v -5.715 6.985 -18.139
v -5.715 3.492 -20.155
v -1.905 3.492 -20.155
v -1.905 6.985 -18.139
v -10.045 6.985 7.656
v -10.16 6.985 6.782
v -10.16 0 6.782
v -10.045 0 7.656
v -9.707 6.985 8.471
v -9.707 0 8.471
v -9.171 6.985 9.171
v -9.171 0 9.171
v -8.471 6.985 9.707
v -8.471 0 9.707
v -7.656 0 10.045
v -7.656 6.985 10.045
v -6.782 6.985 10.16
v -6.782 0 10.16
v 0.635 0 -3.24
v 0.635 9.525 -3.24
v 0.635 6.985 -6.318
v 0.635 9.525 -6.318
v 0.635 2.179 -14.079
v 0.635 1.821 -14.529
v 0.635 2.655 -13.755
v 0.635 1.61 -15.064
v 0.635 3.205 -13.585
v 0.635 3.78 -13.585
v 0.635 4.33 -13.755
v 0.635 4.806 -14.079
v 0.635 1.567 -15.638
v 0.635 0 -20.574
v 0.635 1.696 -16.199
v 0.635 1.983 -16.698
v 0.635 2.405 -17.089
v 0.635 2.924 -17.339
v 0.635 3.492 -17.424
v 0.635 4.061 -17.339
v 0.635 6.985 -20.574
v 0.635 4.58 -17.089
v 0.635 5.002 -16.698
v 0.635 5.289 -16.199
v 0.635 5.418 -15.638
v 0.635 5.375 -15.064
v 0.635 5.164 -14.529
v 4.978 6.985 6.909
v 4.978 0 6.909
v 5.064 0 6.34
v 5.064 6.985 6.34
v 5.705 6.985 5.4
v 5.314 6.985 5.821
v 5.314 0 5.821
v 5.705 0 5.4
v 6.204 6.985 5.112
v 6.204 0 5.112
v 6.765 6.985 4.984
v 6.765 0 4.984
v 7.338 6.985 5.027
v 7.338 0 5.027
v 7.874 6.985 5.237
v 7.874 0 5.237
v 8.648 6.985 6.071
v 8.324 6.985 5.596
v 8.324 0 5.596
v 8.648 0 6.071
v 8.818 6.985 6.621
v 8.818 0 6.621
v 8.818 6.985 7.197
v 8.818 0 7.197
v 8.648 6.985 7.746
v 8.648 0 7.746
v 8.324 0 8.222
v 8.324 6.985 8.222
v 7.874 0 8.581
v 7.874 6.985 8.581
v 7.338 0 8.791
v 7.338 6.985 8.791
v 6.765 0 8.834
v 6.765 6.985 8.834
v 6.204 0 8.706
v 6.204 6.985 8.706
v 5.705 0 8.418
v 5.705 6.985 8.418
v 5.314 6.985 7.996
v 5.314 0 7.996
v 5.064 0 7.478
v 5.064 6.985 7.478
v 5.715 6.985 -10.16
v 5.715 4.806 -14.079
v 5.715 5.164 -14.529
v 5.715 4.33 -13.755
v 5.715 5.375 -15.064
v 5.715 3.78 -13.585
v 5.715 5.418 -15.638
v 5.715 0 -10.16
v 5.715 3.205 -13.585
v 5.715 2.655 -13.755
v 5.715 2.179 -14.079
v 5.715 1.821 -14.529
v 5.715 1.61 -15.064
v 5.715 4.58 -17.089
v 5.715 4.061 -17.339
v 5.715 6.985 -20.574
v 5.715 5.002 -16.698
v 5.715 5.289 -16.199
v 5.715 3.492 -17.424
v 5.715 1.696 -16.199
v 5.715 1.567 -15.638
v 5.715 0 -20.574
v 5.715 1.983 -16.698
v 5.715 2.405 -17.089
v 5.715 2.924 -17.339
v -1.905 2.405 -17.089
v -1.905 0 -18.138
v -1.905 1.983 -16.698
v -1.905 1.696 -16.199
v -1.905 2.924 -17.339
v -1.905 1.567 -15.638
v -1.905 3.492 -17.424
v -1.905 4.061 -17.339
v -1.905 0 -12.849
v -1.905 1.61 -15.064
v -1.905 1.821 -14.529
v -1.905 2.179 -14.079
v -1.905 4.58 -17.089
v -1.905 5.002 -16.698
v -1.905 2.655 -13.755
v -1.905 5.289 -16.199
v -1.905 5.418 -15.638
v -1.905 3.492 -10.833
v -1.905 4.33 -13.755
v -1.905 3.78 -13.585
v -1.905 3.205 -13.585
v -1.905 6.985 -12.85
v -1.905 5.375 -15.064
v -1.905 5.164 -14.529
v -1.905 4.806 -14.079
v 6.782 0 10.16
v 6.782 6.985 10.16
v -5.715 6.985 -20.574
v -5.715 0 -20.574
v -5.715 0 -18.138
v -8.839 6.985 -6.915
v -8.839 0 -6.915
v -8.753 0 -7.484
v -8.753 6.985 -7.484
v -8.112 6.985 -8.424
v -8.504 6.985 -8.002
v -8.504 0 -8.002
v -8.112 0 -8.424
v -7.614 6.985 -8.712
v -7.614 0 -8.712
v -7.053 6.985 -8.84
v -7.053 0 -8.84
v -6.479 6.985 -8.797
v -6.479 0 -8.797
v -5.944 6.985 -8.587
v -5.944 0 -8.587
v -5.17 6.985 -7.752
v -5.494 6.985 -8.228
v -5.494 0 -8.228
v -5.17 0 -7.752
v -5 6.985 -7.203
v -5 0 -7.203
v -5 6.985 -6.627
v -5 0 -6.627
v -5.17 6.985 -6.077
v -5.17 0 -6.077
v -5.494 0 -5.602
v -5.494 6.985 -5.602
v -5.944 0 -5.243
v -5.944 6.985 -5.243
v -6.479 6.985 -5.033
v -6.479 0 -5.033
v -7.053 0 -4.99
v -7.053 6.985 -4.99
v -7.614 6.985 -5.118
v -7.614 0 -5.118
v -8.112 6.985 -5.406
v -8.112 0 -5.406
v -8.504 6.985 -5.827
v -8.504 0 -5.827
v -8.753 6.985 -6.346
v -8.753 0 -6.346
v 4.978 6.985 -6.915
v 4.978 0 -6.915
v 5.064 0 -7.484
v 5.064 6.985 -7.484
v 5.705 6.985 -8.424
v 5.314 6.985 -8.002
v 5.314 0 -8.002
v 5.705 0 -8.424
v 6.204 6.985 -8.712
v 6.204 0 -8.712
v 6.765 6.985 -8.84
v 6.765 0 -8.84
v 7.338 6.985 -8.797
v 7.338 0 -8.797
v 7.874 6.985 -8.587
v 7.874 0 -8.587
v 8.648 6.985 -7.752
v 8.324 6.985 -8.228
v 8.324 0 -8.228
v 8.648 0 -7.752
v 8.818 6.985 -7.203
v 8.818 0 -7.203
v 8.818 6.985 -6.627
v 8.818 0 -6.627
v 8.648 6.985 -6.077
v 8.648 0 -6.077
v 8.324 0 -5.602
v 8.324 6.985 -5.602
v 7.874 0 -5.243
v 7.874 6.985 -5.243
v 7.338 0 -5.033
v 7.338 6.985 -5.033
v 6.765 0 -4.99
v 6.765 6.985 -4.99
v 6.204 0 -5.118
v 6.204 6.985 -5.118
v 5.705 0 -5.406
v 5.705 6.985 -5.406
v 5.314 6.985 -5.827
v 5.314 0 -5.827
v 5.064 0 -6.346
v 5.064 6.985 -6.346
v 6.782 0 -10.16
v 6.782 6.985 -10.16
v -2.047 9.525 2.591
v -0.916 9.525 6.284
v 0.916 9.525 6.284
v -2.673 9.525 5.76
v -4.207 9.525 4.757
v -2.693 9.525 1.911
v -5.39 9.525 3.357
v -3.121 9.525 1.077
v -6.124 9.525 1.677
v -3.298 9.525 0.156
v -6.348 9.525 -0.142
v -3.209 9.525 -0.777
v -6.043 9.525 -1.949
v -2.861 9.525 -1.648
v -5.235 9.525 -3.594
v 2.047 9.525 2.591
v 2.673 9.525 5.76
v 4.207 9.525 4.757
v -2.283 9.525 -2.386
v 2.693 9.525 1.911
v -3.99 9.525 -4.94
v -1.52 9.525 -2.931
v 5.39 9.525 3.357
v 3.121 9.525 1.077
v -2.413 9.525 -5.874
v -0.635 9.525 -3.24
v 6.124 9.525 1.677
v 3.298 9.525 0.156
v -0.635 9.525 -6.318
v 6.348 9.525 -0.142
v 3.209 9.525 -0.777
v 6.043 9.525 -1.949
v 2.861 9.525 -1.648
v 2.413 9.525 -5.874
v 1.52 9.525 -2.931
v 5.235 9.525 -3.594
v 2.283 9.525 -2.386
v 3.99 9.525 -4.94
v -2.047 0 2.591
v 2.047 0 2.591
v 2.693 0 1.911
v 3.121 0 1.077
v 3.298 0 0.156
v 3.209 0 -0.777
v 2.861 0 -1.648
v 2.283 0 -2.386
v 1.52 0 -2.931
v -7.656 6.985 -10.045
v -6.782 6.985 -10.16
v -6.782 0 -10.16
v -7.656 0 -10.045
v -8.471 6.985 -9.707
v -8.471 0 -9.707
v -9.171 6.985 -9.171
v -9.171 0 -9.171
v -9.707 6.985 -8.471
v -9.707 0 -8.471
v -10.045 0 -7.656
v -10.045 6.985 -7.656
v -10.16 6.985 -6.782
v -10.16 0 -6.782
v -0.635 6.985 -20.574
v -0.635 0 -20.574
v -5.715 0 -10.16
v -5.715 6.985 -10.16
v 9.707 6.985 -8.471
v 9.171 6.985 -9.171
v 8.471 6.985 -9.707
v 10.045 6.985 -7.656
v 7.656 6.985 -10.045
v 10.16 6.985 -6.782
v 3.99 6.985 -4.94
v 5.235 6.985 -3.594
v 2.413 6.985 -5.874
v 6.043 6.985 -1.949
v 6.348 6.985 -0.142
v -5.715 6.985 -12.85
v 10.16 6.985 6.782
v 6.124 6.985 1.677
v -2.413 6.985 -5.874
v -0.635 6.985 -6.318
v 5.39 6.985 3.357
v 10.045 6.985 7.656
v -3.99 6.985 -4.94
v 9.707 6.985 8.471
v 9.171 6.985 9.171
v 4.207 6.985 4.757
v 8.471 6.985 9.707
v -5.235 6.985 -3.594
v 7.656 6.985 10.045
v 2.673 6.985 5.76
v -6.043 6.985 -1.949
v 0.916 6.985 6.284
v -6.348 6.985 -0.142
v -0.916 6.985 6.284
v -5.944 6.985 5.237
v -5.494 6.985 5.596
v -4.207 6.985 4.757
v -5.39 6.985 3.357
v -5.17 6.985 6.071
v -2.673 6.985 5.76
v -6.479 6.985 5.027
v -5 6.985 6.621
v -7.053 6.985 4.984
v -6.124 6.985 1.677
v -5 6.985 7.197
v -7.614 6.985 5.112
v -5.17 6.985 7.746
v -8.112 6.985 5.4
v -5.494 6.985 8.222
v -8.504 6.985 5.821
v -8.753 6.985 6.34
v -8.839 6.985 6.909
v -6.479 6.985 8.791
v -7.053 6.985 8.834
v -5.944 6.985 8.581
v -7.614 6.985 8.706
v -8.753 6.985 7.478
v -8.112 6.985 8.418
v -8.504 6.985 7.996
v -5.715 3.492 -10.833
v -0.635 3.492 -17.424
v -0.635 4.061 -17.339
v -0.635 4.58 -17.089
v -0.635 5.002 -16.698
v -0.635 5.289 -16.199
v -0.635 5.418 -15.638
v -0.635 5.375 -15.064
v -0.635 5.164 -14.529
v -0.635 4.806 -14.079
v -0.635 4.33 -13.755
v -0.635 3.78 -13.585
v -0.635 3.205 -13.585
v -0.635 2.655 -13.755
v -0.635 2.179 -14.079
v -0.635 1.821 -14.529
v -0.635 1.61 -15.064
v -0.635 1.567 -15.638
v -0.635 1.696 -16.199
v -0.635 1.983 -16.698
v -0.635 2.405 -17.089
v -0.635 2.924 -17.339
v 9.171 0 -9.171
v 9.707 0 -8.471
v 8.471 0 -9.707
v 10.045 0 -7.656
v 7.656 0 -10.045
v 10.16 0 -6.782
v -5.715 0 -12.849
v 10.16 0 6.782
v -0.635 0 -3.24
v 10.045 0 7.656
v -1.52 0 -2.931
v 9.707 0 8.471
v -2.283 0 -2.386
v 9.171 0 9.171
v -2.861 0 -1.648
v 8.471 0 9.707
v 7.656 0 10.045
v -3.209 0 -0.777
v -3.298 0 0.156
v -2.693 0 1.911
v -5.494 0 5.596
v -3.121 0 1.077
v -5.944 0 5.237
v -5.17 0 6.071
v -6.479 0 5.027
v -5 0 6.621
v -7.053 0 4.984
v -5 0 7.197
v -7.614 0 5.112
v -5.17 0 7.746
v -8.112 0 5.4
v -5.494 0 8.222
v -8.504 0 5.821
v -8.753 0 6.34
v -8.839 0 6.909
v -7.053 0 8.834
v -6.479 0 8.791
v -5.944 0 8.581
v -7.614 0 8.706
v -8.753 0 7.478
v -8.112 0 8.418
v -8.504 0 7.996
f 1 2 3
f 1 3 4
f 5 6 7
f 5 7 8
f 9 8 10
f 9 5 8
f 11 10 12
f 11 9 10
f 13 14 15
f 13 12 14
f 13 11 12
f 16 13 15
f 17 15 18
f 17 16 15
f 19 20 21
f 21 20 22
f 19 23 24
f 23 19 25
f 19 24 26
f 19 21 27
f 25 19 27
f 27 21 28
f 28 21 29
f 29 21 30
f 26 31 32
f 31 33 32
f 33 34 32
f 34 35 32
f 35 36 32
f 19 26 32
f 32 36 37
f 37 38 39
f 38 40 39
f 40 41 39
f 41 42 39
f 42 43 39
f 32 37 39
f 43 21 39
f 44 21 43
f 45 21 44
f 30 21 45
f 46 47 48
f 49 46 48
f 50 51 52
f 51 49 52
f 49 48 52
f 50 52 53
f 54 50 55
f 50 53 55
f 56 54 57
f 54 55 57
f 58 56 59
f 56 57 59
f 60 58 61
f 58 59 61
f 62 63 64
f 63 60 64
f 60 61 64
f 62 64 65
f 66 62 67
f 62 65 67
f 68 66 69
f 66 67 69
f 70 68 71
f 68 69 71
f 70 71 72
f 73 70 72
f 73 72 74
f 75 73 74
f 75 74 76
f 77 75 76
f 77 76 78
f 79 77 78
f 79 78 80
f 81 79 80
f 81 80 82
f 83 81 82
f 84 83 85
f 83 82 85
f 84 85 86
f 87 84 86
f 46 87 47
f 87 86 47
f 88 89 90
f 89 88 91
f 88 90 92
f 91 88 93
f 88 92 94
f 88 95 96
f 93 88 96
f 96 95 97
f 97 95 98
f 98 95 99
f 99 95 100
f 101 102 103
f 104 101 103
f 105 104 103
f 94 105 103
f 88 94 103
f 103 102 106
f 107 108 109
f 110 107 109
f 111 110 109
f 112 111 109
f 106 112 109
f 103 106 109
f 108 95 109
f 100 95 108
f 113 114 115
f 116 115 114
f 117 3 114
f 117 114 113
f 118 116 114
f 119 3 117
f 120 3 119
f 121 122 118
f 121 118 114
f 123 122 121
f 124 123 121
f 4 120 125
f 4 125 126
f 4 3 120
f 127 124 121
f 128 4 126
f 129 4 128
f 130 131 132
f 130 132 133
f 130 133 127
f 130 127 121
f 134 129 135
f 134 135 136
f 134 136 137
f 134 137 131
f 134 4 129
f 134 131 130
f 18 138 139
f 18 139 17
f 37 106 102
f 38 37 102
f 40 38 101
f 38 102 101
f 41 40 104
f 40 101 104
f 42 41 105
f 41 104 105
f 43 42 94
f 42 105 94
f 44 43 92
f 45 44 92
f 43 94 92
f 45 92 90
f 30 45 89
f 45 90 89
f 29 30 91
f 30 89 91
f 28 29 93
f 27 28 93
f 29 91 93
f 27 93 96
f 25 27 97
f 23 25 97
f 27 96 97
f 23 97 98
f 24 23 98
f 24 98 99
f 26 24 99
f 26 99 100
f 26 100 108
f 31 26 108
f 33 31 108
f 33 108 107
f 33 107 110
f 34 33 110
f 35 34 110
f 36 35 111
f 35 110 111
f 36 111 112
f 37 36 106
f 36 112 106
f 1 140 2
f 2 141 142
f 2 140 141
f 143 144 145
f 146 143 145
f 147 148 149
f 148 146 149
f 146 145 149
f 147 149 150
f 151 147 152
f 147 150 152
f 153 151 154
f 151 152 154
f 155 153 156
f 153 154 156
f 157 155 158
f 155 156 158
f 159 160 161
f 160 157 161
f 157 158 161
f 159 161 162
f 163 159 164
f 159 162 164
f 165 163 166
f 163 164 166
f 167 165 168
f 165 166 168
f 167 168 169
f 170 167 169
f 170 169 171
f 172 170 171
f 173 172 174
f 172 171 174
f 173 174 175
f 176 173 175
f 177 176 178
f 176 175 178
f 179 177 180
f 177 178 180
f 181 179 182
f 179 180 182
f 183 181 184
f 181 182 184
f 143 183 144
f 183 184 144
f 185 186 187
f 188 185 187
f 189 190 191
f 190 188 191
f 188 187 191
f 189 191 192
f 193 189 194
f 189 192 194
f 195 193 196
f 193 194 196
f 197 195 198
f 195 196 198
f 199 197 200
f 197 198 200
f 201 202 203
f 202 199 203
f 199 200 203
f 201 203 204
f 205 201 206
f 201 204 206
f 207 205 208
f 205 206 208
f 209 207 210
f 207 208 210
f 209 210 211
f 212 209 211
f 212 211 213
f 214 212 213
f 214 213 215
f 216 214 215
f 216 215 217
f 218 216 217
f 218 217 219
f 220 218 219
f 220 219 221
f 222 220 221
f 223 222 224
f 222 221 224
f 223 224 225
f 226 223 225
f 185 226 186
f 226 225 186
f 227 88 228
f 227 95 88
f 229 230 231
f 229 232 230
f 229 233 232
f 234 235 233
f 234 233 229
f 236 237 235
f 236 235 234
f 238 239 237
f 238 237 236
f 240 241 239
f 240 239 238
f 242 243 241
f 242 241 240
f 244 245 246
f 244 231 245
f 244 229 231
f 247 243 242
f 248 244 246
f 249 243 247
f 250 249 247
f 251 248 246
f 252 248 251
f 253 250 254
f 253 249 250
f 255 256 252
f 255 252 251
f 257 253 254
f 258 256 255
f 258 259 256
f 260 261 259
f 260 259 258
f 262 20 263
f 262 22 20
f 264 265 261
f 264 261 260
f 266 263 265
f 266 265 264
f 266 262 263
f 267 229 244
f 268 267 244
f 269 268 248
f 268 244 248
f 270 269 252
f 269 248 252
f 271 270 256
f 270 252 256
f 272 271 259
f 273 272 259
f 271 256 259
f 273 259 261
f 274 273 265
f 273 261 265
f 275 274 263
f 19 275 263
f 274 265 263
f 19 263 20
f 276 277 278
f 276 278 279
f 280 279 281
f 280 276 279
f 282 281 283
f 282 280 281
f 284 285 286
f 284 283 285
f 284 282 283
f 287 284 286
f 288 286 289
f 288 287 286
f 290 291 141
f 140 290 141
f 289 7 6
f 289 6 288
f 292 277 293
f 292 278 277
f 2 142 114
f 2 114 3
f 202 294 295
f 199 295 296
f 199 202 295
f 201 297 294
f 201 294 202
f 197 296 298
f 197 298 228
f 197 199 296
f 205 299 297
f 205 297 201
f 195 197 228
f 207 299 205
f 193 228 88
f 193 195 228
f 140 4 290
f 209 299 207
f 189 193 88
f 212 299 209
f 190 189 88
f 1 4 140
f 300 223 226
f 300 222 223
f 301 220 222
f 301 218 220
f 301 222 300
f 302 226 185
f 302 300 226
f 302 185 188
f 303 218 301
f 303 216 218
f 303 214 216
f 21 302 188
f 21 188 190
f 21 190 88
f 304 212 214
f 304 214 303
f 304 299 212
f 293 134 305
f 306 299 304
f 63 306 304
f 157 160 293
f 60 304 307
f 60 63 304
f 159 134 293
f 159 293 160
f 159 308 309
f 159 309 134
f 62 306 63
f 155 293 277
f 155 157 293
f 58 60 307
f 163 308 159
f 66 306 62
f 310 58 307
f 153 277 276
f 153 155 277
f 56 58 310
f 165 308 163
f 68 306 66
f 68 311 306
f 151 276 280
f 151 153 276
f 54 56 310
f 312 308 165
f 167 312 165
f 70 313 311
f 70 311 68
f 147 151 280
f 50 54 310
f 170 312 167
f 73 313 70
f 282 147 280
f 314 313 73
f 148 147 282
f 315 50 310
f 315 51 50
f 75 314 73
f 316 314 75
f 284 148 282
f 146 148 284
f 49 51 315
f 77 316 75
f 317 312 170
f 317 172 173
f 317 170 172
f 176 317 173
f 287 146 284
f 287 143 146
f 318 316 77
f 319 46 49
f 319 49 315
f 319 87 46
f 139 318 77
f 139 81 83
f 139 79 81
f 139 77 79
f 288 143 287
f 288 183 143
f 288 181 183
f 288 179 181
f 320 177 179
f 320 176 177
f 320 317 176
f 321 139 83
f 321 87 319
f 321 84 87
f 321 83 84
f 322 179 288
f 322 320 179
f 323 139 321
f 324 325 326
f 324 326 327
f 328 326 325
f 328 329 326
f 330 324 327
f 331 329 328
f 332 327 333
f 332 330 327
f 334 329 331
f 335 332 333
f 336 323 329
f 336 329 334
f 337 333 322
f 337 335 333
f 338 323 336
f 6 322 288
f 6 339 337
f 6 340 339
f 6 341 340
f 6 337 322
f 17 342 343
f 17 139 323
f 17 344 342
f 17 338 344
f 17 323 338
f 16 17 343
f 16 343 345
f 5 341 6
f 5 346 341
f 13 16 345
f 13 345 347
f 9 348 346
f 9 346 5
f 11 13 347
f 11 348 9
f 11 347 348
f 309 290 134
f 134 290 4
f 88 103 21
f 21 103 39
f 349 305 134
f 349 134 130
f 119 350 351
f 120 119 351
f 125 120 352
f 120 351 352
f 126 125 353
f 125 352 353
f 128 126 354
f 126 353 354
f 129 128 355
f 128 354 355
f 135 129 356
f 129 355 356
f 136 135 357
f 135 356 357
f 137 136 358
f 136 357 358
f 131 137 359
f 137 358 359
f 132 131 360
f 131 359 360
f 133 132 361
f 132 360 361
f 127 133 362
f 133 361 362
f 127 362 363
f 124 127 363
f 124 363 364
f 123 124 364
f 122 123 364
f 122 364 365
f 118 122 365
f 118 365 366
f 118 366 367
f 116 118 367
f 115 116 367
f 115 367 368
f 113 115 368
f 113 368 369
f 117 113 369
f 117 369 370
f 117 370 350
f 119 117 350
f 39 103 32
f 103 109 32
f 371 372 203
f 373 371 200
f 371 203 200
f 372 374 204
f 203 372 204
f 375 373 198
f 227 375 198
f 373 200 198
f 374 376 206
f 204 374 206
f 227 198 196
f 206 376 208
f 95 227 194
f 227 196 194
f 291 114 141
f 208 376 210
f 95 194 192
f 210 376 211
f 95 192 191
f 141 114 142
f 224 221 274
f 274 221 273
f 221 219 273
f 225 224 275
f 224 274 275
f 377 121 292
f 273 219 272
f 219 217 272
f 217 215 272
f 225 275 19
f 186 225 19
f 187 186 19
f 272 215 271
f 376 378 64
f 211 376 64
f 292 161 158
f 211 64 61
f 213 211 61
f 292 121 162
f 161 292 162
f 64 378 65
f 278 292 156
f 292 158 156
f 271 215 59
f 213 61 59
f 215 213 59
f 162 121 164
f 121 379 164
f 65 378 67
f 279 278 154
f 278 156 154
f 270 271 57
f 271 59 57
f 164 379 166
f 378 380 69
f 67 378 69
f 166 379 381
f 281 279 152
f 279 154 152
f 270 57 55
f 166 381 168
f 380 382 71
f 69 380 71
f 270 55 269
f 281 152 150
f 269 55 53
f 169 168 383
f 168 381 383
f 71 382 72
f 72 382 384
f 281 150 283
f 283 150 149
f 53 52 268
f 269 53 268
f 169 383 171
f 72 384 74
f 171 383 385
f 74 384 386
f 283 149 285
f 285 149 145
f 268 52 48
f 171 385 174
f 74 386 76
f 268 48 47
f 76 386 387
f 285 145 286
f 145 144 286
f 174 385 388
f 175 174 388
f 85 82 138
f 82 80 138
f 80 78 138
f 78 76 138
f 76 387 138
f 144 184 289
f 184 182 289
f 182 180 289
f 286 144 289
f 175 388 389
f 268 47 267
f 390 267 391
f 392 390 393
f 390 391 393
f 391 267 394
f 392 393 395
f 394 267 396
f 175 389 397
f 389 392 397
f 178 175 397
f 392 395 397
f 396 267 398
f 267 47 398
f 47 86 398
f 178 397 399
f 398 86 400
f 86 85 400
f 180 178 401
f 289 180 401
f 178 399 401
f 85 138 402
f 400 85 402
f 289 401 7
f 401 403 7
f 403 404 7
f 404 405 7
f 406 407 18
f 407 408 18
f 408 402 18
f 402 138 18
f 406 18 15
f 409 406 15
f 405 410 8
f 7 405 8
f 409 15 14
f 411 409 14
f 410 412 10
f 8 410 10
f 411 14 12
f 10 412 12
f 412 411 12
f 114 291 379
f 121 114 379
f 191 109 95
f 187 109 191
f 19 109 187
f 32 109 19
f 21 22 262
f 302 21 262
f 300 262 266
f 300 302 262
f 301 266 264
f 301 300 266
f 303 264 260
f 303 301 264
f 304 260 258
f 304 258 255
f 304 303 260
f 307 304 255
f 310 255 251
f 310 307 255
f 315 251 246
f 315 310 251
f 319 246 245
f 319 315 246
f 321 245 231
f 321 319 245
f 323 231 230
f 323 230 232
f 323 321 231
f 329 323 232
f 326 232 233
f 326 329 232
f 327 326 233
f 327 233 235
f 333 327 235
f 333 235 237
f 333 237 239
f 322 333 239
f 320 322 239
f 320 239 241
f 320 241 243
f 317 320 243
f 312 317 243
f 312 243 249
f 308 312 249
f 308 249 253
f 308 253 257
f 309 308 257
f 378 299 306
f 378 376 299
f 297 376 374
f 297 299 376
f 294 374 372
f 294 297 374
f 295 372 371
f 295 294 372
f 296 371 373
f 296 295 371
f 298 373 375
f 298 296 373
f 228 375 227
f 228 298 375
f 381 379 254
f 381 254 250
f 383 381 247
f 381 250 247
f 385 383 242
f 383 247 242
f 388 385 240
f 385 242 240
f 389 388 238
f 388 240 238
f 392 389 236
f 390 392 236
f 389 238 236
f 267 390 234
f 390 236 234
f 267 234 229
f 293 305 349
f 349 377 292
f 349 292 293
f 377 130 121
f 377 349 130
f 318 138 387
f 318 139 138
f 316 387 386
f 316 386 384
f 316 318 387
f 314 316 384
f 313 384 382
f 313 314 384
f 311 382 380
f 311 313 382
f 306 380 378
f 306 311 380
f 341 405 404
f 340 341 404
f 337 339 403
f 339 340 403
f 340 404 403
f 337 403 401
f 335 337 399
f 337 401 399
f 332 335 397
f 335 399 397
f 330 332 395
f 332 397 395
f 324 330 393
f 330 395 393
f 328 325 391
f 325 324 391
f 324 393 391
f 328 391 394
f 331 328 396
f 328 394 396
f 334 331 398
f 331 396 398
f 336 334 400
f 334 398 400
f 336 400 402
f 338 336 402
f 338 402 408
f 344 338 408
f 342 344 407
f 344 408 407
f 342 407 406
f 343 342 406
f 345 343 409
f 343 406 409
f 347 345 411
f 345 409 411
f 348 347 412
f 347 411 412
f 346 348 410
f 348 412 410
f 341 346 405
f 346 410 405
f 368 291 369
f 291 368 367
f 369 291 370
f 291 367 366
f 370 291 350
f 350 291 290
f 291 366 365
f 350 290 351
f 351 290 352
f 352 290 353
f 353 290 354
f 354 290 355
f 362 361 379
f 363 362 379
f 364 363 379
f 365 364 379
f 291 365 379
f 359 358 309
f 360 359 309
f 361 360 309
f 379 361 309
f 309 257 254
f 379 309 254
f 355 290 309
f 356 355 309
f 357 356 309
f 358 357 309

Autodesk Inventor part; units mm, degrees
ref_plane "YZ Plane" through (0, 0, 0) normal (1, 0, 0) x (0, 1, 0)
ref_plane "XZ Plane" through (0, 0, 0) normal (0, 1, 0) x (-1, 0, 0)
ref_plane "XY Plane" through (0, 0, 0) normal (0, 0, 1) x (1, 0, 0)
sketch "Sketch1" plane through (0, 0, 0) normal (0, 1, 0) x (-1, 0, 0)
  line L0 (-10.16, 10.16) -> (10.16, 10.16)
  line L1 (10.16, 10.16) -> (10.16, -10.16)
  line L2 (-10.16, -10.16) -> (-10.16, 10.16)
  circle A0 centre (6.9088, -6.9148) radius 1.9304
  circle A1 centre (6.9088, 6.9088) radius 1.9304
  circle A2 centre (-6.9088, 6.9088) radius 1.9304
  circle A3 centre (-6.9088, -6.9148) radius 1.9304
  line L3 (-5.715, -10.16) -> (-5.715, -20.574)
  line L4 (-5.715, -20.574) -> (5.715, -20.574)
  line L5 (5.715, -20.574) -> (5.715, -10.16)
  line L6 (10.16, -10.16) -> (5.715, -10.16)
  line L7 (-5.715, -10.16) -> (-10.16, -10.16)
  point P0 (0, 0)
  dimension "d0" = 20.32
  dimension "d2" = 10.16
  dimension "d3" = 10.16
  dimension "d4" = 3.8608
  dimension "d5" = 6.9148
  dimension "d6" = 6.9088
  dimension "d7" = 3.8608
  dimension "d8" = 6.9088
  dimension "d9" = 6.9088
  dimension "d10" = 3.8608
  dimension "d11" = 6.9088
  dimension "d12" = 6.9088
  dimension "d13" = 3.8608
  dimension "d14" = 11.43
  dimension "d16" = 5.715
extrude "Extrusion1" add sketch "Sketch1" along normal blind 6.985
sketch "Sketch2" plane through (-5.715, 0, -20.574) normal (-1, 0, 0) x (0, 0, 1)
  circle A0 centre (5.08, 3.4925) radius 4.6609 construction
  line L0 (10.414, 0) -> (0, 0) projected
  line L1 (0, 0) -> (0, 6.985) projected
  line L2 (9.7409, 3.4925) -> (7.4105, -0.544)
  line L3 (7.4105, -0.544) -> (2.7496, -0.544)
  line L4 (2.7496, -0.544) -> (0.4191, 3.4925)
  line L5 (0.4191, 3.4925) -> (2.7495, 7.529)
  line L6 (2.7495, 7.529) -> (7.4104, 7.529)
  line L7 (7.4104, 7.529) -> (9.7409, 3.4925)
  point P0 (20.574, 0)
  dimension "d19" = 9.3218
  dimension "d20" = 3.4925
  dimension "d21" = 5.08
extrude "Extrusion2" cut sketch "Sketch2" against normal blind 3.81
sketch "Sketch3" plane through (5.715, 0, -10.16) normal (1, 0, 0) x (0, 0, -1)
  circle A0 centre (5.334, 3.4925) radius 1.9304
  line L0 (10.414, 0) -> (10.414, 6.985) projected
  line L1 (0, 6.985) -> (10.414, 6.985) projected
  point P0 (-10.16, 0)
  dimension "d24" = 3.8608
  dimension "d25" = 5.08
  dimension "d26" = 3.4925
extrude "Extrusion3" cut sketch "Sketch3" against normal through all
sketch "Sketch4" plane through (0, 6.985, 0) normal (0, 1, 0) x (1, 0, 0)
  circle A0 centre (0, 0) radius 6.35
  dimension "d29" = 12.7
extrude "Extrusion4" add sketch "Sketch4" along normal blind 2.54
sketch "Sketch5" plane through (0, 9.525, 0) normal (0, 1, 0) x (1, 0, 0)
  arc A0 (2.0472, -2.5908) -> (-2.0472, -2.5908) centre (0, 0) ccw
  line L0 (-2.0472, -2.5908) -> (2.0472, -2.5908)
  dimension "d32" = 6.604
  dimension "d33" = 2.5908
fillet "Fillet1" radius 3.3782 4 edges at (10.16, 3.4925, 10.16) (10.16, 3.4925, -10.16) (-10.16, 3.4925, 10.16) (-10.16, 3.4925, -10.16)
extrude "Extrusion5" cut sketch "Sketch5" against normal through all
sketch "Sketch6" plane through (0, 9.525, 0) normal (0, 1, 0) x (1, 0, 0)
  line L0 (-5.715, 20.574) -> (5.715, 20.574) projected
  line L1 (0.635, 0) -> (0.635, 20.574)
  line L2 (0.635, 20.574) -> (-0.635, 20.574)
  line L3 (-0.635, 20.574) -> (-0.635, 0)
  line L4 (-0.635, -20.574) -> (0.635, 20.574) construction
  line L5 (0.635, -20.574) -> (-0.635, 20.574) construction
  line L6 (-0.635, 0) -> (0.635, 0)
  point P0 (0, 0)
  dimension "d37" = 1.27
extrude "Extrusion6" cut sketch "Sketch6" against normal through all
properties part number "clamping hub 1_4 D a"
